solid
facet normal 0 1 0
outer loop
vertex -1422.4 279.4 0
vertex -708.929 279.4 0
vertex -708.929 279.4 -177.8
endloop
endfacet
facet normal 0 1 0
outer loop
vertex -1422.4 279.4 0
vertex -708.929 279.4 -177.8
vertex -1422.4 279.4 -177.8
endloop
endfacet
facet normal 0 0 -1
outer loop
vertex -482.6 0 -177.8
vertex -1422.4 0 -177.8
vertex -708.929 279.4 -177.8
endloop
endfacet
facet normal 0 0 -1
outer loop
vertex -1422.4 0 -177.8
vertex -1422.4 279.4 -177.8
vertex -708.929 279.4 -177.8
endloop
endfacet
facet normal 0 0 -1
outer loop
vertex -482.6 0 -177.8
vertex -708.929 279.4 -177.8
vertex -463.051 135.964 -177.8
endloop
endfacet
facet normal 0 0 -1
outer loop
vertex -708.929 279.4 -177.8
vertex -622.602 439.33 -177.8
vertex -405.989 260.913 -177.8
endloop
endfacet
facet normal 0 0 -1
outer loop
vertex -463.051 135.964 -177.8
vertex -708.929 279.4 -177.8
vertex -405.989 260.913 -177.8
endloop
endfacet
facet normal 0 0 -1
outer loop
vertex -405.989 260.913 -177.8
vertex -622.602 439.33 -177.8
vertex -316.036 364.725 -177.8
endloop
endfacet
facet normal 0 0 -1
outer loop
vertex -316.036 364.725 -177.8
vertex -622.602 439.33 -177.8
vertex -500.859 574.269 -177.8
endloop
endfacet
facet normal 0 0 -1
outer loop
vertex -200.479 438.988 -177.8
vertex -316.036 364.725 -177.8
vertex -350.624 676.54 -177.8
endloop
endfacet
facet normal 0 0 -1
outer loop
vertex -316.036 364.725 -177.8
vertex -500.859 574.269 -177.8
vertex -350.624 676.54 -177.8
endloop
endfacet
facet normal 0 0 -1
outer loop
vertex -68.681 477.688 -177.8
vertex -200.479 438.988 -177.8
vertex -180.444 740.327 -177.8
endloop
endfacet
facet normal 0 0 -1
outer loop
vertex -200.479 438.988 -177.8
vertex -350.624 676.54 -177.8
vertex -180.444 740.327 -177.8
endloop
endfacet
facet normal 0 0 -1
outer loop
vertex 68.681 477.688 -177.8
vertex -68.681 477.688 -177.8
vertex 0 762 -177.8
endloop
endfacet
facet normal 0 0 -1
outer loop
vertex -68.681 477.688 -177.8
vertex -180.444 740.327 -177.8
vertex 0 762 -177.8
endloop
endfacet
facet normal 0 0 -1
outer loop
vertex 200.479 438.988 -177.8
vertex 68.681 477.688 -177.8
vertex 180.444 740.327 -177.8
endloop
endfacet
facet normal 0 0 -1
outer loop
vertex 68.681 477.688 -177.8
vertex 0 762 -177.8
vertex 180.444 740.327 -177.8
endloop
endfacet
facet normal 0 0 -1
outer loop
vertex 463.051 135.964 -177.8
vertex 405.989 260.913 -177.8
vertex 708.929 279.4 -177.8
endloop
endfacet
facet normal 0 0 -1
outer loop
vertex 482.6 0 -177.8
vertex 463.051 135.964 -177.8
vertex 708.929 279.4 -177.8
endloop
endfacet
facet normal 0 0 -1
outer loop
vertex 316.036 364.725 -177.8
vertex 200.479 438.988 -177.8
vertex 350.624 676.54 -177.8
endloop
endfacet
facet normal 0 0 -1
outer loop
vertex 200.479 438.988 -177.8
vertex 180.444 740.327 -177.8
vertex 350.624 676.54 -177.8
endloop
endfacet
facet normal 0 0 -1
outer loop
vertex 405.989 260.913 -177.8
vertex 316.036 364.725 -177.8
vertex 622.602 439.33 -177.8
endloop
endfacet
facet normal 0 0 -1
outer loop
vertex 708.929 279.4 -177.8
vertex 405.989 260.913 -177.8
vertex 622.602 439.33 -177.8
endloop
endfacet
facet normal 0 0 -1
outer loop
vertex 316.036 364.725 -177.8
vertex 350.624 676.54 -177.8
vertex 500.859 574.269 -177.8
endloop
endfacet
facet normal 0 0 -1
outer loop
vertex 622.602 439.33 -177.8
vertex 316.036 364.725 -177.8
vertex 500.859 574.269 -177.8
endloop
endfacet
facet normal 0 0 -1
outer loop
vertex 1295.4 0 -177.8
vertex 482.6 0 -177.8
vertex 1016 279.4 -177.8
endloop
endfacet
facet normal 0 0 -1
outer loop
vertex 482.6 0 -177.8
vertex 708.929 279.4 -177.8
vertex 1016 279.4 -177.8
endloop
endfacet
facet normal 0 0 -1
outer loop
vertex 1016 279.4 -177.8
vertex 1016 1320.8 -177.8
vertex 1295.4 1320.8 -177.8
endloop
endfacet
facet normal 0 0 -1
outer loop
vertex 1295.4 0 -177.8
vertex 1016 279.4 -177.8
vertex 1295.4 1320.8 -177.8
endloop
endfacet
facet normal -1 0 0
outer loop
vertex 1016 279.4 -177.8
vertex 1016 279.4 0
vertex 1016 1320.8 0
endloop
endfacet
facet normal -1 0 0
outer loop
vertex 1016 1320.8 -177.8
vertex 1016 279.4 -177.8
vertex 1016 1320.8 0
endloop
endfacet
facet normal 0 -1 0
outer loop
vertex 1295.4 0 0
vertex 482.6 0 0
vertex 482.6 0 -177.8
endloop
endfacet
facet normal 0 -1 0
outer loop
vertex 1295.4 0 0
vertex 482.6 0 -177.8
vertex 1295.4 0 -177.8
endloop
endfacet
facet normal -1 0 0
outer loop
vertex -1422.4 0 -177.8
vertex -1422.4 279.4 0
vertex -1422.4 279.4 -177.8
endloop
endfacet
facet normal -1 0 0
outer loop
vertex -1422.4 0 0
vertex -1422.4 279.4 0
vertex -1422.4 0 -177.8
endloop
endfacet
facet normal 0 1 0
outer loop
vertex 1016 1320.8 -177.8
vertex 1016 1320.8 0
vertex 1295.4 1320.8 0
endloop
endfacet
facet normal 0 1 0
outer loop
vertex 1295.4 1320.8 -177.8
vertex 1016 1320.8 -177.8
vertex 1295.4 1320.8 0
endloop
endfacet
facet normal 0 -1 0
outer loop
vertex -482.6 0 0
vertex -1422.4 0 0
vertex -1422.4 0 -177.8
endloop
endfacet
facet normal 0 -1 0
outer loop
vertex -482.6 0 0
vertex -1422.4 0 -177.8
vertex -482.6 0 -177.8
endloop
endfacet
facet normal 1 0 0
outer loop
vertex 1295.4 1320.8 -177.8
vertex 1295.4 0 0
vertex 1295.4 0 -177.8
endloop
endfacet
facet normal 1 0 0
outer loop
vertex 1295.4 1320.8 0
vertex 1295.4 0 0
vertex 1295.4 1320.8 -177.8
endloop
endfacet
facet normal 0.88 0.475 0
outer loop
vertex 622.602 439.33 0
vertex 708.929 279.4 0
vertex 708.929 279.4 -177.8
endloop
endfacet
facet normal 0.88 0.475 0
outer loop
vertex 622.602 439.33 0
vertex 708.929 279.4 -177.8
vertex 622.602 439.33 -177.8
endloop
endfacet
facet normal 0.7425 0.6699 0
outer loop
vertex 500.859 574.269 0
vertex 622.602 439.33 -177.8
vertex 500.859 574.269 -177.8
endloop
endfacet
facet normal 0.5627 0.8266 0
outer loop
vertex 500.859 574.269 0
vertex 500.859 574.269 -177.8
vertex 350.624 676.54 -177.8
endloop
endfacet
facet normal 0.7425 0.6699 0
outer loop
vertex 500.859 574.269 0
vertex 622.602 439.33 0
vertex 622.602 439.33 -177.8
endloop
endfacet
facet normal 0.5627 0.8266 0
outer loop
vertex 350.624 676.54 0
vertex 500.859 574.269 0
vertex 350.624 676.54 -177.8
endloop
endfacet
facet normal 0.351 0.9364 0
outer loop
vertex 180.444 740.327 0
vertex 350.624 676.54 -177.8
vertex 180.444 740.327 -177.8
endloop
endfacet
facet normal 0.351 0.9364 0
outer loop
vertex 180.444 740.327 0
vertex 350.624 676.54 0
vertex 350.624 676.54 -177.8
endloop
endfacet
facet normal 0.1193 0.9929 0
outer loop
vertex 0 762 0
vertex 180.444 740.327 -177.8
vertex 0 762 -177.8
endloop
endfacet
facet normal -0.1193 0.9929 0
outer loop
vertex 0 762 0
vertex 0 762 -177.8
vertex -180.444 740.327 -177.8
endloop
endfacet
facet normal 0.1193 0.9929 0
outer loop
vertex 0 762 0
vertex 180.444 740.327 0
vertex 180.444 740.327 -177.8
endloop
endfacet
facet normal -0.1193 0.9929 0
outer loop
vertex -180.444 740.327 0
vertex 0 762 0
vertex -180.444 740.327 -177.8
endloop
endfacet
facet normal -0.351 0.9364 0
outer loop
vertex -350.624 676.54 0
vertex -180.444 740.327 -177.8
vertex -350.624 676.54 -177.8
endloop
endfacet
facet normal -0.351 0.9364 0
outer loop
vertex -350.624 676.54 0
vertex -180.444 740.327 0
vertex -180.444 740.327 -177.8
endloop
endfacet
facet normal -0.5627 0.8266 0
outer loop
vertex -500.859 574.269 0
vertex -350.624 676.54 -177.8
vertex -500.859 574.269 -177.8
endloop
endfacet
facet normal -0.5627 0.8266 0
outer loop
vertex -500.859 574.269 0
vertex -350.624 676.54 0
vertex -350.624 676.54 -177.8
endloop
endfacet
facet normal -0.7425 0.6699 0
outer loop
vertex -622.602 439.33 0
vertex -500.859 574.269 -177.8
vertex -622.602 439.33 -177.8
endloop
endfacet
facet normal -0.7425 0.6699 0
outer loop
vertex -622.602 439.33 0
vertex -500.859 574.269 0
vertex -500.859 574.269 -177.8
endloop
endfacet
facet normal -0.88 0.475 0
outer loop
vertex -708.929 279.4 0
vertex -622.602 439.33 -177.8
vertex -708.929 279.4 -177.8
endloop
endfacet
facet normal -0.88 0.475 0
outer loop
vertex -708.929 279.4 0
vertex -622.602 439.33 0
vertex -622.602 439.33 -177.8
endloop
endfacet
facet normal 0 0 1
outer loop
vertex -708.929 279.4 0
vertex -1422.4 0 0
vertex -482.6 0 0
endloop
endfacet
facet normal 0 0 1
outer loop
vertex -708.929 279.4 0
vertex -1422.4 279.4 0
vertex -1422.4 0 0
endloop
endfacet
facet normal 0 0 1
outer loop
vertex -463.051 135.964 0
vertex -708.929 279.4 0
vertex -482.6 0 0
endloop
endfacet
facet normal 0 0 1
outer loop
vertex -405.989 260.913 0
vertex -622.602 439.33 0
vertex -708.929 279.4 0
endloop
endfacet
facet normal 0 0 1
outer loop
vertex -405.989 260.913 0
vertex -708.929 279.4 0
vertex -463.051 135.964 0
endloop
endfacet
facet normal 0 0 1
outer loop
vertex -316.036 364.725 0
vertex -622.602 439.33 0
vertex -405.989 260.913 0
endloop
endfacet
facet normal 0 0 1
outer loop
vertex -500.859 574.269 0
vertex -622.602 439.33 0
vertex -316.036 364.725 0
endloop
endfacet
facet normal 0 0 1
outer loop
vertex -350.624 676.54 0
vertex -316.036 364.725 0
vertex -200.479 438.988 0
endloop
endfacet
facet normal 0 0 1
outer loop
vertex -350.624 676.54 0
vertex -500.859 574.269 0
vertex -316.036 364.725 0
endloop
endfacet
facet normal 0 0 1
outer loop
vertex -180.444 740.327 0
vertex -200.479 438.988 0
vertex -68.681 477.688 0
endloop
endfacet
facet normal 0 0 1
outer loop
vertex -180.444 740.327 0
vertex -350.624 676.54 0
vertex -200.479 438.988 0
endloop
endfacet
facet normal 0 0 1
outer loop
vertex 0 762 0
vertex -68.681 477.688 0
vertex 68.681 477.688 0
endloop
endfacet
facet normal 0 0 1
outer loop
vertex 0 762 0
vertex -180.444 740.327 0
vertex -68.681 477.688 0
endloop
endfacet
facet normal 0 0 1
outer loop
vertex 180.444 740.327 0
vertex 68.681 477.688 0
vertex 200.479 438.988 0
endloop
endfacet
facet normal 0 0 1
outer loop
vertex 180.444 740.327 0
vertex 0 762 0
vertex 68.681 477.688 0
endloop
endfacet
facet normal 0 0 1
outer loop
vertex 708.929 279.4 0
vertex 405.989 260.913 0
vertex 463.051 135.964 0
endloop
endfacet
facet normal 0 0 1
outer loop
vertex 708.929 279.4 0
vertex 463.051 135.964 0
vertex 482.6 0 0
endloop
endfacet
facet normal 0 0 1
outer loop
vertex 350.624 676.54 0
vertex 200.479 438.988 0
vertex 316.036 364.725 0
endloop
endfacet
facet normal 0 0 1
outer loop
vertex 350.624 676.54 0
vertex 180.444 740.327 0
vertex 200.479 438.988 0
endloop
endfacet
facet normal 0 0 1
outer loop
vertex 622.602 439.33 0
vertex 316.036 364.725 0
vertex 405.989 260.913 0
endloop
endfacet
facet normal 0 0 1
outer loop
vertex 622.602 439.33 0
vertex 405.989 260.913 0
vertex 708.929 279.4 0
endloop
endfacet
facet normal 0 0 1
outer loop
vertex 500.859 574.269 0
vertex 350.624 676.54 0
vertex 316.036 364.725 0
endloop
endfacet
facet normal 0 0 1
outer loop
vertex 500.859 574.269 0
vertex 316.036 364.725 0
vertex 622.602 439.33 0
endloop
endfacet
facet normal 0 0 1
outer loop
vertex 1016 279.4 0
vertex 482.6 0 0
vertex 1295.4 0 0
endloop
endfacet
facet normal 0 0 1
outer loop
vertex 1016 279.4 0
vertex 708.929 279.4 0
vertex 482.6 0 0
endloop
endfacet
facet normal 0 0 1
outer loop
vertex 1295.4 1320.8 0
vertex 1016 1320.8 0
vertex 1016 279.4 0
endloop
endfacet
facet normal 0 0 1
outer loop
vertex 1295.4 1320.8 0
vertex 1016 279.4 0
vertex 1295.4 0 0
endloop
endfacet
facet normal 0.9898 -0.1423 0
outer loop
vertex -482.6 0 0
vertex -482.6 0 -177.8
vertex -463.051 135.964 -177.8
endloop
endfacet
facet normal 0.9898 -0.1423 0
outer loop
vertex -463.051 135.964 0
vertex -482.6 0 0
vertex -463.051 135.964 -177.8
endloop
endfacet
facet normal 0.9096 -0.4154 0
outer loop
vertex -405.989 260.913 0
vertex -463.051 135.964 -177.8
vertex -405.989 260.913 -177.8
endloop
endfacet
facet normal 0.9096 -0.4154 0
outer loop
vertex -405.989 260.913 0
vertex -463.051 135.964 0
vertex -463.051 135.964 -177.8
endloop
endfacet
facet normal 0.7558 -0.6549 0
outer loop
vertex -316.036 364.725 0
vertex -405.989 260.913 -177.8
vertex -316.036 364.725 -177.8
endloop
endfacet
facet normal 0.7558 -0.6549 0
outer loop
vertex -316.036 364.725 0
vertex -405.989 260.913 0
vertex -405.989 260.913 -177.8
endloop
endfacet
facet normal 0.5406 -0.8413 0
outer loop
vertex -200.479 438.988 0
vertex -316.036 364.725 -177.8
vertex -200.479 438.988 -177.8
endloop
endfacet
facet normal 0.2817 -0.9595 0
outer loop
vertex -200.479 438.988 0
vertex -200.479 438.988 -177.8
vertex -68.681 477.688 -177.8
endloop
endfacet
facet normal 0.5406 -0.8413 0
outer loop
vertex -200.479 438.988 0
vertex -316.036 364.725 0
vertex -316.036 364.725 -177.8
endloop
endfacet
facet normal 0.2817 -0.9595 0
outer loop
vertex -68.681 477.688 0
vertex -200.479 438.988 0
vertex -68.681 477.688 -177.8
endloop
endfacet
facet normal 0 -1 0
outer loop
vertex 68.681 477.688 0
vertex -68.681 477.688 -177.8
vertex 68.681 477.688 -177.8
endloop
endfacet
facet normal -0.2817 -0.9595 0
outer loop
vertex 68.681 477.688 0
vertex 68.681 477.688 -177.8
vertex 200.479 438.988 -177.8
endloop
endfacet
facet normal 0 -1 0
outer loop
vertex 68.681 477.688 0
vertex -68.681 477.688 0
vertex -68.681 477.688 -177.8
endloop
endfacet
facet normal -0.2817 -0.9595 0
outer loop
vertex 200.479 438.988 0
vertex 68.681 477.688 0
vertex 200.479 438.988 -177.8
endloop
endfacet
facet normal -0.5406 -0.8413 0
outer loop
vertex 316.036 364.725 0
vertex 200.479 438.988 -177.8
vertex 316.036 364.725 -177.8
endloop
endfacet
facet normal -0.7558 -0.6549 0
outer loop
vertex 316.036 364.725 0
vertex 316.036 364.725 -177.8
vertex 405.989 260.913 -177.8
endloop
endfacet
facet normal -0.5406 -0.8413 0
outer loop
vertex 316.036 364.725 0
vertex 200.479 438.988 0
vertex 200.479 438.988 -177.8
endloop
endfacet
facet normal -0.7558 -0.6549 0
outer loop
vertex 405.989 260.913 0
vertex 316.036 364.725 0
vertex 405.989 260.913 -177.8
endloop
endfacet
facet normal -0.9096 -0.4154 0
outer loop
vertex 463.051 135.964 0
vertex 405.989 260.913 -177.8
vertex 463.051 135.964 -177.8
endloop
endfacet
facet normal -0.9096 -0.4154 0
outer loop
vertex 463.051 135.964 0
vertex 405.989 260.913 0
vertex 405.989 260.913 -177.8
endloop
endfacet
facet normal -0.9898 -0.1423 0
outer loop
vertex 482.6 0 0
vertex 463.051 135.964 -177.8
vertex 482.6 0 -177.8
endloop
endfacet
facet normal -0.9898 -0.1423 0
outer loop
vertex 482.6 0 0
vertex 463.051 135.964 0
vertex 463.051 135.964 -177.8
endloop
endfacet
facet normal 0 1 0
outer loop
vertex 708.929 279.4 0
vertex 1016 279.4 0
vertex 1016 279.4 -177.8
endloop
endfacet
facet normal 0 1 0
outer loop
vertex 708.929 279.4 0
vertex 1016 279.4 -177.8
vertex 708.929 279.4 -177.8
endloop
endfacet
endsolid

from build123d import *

# Parameters (mm, degrees)
F0_W     = 279.4
F0_H     = 1041.4
F1_DEPTH = 177.8


with BuildPart() as f1:
    # F0 (on Top) → F1 (new body)
    with BuildSketch(Plane.XY):
        with BuildLine():
            Line((-1422.4, 0), (-762, 0))
            ThreePointArc((-762, 0), (-748.6145632978, 142.1978748731), (-708.9285154372, 279.4))
            Line((-708.9285154372, 279.4), (-1422.4, 279.4))
            Line((-1422.4, 279.4), (-1422.4, 0))
        make_face()
        with BuildLine():
            Line((-762, 0), (-482.6, 0))
            ThreePointArc((-482.6, 0), (-459.7844598878, 146.6322285369), (-393.4951079747, 279.4))
            Line((-393.4951079747, 279.4), (-708.9285154372, 279.4))
            ThreePointArc((-708.9285154372, 279.4), (-748.6145632978, 142.1978748731), (-762, 0))
        make_face()
        with BuildLine():
            ThreePointArc((393.4951079747, 279.4), (459.7844598878, 146.6322285369), (482.6, 0))
            Line((482.6, 0), (762, 0))
            ThreePointArc((762, 0), (748.6145632978, 142.1978748731), (708.9285154372, 279.4))
            Line((708.9285154372, 279.4), (393.4951079747, 279.4))
        make_face()
        with BuildLine():
            ThreePointArc((708.9285154372, 279.4), (748.6145632978, 142.1978748731), (762, 0))
            Line((762, 0), (1295.4, 0))
            Line((1295.4, 0), (1295.4, 279.4))
            Line((1295.4, 279.4), (1016, 279.4))
            Line((1016, 279.4), (708.9285154372, 279.4))
        make_face()
        with Locations((1155.7, 800.1)):
            Rectangle(F0_W, F0_H)
        with BuildLine():
            ThreePointArc((-393.4951079747, 279.4), (0, 482.6), (393.4951079747, 279.4))
            Line((393.4951079747, 279.4), (708.9285154372, 279.4))
            ThreePointArc((708.9285154372, 279.4), (0, 762), (-708.9285154372, 279.4))
            Line((-708.9285154372, 279.4), (-393.4951079747, 279.4))
        make_face()
    extrude(amount=-F1_DEPTH)


solid = f1.part
